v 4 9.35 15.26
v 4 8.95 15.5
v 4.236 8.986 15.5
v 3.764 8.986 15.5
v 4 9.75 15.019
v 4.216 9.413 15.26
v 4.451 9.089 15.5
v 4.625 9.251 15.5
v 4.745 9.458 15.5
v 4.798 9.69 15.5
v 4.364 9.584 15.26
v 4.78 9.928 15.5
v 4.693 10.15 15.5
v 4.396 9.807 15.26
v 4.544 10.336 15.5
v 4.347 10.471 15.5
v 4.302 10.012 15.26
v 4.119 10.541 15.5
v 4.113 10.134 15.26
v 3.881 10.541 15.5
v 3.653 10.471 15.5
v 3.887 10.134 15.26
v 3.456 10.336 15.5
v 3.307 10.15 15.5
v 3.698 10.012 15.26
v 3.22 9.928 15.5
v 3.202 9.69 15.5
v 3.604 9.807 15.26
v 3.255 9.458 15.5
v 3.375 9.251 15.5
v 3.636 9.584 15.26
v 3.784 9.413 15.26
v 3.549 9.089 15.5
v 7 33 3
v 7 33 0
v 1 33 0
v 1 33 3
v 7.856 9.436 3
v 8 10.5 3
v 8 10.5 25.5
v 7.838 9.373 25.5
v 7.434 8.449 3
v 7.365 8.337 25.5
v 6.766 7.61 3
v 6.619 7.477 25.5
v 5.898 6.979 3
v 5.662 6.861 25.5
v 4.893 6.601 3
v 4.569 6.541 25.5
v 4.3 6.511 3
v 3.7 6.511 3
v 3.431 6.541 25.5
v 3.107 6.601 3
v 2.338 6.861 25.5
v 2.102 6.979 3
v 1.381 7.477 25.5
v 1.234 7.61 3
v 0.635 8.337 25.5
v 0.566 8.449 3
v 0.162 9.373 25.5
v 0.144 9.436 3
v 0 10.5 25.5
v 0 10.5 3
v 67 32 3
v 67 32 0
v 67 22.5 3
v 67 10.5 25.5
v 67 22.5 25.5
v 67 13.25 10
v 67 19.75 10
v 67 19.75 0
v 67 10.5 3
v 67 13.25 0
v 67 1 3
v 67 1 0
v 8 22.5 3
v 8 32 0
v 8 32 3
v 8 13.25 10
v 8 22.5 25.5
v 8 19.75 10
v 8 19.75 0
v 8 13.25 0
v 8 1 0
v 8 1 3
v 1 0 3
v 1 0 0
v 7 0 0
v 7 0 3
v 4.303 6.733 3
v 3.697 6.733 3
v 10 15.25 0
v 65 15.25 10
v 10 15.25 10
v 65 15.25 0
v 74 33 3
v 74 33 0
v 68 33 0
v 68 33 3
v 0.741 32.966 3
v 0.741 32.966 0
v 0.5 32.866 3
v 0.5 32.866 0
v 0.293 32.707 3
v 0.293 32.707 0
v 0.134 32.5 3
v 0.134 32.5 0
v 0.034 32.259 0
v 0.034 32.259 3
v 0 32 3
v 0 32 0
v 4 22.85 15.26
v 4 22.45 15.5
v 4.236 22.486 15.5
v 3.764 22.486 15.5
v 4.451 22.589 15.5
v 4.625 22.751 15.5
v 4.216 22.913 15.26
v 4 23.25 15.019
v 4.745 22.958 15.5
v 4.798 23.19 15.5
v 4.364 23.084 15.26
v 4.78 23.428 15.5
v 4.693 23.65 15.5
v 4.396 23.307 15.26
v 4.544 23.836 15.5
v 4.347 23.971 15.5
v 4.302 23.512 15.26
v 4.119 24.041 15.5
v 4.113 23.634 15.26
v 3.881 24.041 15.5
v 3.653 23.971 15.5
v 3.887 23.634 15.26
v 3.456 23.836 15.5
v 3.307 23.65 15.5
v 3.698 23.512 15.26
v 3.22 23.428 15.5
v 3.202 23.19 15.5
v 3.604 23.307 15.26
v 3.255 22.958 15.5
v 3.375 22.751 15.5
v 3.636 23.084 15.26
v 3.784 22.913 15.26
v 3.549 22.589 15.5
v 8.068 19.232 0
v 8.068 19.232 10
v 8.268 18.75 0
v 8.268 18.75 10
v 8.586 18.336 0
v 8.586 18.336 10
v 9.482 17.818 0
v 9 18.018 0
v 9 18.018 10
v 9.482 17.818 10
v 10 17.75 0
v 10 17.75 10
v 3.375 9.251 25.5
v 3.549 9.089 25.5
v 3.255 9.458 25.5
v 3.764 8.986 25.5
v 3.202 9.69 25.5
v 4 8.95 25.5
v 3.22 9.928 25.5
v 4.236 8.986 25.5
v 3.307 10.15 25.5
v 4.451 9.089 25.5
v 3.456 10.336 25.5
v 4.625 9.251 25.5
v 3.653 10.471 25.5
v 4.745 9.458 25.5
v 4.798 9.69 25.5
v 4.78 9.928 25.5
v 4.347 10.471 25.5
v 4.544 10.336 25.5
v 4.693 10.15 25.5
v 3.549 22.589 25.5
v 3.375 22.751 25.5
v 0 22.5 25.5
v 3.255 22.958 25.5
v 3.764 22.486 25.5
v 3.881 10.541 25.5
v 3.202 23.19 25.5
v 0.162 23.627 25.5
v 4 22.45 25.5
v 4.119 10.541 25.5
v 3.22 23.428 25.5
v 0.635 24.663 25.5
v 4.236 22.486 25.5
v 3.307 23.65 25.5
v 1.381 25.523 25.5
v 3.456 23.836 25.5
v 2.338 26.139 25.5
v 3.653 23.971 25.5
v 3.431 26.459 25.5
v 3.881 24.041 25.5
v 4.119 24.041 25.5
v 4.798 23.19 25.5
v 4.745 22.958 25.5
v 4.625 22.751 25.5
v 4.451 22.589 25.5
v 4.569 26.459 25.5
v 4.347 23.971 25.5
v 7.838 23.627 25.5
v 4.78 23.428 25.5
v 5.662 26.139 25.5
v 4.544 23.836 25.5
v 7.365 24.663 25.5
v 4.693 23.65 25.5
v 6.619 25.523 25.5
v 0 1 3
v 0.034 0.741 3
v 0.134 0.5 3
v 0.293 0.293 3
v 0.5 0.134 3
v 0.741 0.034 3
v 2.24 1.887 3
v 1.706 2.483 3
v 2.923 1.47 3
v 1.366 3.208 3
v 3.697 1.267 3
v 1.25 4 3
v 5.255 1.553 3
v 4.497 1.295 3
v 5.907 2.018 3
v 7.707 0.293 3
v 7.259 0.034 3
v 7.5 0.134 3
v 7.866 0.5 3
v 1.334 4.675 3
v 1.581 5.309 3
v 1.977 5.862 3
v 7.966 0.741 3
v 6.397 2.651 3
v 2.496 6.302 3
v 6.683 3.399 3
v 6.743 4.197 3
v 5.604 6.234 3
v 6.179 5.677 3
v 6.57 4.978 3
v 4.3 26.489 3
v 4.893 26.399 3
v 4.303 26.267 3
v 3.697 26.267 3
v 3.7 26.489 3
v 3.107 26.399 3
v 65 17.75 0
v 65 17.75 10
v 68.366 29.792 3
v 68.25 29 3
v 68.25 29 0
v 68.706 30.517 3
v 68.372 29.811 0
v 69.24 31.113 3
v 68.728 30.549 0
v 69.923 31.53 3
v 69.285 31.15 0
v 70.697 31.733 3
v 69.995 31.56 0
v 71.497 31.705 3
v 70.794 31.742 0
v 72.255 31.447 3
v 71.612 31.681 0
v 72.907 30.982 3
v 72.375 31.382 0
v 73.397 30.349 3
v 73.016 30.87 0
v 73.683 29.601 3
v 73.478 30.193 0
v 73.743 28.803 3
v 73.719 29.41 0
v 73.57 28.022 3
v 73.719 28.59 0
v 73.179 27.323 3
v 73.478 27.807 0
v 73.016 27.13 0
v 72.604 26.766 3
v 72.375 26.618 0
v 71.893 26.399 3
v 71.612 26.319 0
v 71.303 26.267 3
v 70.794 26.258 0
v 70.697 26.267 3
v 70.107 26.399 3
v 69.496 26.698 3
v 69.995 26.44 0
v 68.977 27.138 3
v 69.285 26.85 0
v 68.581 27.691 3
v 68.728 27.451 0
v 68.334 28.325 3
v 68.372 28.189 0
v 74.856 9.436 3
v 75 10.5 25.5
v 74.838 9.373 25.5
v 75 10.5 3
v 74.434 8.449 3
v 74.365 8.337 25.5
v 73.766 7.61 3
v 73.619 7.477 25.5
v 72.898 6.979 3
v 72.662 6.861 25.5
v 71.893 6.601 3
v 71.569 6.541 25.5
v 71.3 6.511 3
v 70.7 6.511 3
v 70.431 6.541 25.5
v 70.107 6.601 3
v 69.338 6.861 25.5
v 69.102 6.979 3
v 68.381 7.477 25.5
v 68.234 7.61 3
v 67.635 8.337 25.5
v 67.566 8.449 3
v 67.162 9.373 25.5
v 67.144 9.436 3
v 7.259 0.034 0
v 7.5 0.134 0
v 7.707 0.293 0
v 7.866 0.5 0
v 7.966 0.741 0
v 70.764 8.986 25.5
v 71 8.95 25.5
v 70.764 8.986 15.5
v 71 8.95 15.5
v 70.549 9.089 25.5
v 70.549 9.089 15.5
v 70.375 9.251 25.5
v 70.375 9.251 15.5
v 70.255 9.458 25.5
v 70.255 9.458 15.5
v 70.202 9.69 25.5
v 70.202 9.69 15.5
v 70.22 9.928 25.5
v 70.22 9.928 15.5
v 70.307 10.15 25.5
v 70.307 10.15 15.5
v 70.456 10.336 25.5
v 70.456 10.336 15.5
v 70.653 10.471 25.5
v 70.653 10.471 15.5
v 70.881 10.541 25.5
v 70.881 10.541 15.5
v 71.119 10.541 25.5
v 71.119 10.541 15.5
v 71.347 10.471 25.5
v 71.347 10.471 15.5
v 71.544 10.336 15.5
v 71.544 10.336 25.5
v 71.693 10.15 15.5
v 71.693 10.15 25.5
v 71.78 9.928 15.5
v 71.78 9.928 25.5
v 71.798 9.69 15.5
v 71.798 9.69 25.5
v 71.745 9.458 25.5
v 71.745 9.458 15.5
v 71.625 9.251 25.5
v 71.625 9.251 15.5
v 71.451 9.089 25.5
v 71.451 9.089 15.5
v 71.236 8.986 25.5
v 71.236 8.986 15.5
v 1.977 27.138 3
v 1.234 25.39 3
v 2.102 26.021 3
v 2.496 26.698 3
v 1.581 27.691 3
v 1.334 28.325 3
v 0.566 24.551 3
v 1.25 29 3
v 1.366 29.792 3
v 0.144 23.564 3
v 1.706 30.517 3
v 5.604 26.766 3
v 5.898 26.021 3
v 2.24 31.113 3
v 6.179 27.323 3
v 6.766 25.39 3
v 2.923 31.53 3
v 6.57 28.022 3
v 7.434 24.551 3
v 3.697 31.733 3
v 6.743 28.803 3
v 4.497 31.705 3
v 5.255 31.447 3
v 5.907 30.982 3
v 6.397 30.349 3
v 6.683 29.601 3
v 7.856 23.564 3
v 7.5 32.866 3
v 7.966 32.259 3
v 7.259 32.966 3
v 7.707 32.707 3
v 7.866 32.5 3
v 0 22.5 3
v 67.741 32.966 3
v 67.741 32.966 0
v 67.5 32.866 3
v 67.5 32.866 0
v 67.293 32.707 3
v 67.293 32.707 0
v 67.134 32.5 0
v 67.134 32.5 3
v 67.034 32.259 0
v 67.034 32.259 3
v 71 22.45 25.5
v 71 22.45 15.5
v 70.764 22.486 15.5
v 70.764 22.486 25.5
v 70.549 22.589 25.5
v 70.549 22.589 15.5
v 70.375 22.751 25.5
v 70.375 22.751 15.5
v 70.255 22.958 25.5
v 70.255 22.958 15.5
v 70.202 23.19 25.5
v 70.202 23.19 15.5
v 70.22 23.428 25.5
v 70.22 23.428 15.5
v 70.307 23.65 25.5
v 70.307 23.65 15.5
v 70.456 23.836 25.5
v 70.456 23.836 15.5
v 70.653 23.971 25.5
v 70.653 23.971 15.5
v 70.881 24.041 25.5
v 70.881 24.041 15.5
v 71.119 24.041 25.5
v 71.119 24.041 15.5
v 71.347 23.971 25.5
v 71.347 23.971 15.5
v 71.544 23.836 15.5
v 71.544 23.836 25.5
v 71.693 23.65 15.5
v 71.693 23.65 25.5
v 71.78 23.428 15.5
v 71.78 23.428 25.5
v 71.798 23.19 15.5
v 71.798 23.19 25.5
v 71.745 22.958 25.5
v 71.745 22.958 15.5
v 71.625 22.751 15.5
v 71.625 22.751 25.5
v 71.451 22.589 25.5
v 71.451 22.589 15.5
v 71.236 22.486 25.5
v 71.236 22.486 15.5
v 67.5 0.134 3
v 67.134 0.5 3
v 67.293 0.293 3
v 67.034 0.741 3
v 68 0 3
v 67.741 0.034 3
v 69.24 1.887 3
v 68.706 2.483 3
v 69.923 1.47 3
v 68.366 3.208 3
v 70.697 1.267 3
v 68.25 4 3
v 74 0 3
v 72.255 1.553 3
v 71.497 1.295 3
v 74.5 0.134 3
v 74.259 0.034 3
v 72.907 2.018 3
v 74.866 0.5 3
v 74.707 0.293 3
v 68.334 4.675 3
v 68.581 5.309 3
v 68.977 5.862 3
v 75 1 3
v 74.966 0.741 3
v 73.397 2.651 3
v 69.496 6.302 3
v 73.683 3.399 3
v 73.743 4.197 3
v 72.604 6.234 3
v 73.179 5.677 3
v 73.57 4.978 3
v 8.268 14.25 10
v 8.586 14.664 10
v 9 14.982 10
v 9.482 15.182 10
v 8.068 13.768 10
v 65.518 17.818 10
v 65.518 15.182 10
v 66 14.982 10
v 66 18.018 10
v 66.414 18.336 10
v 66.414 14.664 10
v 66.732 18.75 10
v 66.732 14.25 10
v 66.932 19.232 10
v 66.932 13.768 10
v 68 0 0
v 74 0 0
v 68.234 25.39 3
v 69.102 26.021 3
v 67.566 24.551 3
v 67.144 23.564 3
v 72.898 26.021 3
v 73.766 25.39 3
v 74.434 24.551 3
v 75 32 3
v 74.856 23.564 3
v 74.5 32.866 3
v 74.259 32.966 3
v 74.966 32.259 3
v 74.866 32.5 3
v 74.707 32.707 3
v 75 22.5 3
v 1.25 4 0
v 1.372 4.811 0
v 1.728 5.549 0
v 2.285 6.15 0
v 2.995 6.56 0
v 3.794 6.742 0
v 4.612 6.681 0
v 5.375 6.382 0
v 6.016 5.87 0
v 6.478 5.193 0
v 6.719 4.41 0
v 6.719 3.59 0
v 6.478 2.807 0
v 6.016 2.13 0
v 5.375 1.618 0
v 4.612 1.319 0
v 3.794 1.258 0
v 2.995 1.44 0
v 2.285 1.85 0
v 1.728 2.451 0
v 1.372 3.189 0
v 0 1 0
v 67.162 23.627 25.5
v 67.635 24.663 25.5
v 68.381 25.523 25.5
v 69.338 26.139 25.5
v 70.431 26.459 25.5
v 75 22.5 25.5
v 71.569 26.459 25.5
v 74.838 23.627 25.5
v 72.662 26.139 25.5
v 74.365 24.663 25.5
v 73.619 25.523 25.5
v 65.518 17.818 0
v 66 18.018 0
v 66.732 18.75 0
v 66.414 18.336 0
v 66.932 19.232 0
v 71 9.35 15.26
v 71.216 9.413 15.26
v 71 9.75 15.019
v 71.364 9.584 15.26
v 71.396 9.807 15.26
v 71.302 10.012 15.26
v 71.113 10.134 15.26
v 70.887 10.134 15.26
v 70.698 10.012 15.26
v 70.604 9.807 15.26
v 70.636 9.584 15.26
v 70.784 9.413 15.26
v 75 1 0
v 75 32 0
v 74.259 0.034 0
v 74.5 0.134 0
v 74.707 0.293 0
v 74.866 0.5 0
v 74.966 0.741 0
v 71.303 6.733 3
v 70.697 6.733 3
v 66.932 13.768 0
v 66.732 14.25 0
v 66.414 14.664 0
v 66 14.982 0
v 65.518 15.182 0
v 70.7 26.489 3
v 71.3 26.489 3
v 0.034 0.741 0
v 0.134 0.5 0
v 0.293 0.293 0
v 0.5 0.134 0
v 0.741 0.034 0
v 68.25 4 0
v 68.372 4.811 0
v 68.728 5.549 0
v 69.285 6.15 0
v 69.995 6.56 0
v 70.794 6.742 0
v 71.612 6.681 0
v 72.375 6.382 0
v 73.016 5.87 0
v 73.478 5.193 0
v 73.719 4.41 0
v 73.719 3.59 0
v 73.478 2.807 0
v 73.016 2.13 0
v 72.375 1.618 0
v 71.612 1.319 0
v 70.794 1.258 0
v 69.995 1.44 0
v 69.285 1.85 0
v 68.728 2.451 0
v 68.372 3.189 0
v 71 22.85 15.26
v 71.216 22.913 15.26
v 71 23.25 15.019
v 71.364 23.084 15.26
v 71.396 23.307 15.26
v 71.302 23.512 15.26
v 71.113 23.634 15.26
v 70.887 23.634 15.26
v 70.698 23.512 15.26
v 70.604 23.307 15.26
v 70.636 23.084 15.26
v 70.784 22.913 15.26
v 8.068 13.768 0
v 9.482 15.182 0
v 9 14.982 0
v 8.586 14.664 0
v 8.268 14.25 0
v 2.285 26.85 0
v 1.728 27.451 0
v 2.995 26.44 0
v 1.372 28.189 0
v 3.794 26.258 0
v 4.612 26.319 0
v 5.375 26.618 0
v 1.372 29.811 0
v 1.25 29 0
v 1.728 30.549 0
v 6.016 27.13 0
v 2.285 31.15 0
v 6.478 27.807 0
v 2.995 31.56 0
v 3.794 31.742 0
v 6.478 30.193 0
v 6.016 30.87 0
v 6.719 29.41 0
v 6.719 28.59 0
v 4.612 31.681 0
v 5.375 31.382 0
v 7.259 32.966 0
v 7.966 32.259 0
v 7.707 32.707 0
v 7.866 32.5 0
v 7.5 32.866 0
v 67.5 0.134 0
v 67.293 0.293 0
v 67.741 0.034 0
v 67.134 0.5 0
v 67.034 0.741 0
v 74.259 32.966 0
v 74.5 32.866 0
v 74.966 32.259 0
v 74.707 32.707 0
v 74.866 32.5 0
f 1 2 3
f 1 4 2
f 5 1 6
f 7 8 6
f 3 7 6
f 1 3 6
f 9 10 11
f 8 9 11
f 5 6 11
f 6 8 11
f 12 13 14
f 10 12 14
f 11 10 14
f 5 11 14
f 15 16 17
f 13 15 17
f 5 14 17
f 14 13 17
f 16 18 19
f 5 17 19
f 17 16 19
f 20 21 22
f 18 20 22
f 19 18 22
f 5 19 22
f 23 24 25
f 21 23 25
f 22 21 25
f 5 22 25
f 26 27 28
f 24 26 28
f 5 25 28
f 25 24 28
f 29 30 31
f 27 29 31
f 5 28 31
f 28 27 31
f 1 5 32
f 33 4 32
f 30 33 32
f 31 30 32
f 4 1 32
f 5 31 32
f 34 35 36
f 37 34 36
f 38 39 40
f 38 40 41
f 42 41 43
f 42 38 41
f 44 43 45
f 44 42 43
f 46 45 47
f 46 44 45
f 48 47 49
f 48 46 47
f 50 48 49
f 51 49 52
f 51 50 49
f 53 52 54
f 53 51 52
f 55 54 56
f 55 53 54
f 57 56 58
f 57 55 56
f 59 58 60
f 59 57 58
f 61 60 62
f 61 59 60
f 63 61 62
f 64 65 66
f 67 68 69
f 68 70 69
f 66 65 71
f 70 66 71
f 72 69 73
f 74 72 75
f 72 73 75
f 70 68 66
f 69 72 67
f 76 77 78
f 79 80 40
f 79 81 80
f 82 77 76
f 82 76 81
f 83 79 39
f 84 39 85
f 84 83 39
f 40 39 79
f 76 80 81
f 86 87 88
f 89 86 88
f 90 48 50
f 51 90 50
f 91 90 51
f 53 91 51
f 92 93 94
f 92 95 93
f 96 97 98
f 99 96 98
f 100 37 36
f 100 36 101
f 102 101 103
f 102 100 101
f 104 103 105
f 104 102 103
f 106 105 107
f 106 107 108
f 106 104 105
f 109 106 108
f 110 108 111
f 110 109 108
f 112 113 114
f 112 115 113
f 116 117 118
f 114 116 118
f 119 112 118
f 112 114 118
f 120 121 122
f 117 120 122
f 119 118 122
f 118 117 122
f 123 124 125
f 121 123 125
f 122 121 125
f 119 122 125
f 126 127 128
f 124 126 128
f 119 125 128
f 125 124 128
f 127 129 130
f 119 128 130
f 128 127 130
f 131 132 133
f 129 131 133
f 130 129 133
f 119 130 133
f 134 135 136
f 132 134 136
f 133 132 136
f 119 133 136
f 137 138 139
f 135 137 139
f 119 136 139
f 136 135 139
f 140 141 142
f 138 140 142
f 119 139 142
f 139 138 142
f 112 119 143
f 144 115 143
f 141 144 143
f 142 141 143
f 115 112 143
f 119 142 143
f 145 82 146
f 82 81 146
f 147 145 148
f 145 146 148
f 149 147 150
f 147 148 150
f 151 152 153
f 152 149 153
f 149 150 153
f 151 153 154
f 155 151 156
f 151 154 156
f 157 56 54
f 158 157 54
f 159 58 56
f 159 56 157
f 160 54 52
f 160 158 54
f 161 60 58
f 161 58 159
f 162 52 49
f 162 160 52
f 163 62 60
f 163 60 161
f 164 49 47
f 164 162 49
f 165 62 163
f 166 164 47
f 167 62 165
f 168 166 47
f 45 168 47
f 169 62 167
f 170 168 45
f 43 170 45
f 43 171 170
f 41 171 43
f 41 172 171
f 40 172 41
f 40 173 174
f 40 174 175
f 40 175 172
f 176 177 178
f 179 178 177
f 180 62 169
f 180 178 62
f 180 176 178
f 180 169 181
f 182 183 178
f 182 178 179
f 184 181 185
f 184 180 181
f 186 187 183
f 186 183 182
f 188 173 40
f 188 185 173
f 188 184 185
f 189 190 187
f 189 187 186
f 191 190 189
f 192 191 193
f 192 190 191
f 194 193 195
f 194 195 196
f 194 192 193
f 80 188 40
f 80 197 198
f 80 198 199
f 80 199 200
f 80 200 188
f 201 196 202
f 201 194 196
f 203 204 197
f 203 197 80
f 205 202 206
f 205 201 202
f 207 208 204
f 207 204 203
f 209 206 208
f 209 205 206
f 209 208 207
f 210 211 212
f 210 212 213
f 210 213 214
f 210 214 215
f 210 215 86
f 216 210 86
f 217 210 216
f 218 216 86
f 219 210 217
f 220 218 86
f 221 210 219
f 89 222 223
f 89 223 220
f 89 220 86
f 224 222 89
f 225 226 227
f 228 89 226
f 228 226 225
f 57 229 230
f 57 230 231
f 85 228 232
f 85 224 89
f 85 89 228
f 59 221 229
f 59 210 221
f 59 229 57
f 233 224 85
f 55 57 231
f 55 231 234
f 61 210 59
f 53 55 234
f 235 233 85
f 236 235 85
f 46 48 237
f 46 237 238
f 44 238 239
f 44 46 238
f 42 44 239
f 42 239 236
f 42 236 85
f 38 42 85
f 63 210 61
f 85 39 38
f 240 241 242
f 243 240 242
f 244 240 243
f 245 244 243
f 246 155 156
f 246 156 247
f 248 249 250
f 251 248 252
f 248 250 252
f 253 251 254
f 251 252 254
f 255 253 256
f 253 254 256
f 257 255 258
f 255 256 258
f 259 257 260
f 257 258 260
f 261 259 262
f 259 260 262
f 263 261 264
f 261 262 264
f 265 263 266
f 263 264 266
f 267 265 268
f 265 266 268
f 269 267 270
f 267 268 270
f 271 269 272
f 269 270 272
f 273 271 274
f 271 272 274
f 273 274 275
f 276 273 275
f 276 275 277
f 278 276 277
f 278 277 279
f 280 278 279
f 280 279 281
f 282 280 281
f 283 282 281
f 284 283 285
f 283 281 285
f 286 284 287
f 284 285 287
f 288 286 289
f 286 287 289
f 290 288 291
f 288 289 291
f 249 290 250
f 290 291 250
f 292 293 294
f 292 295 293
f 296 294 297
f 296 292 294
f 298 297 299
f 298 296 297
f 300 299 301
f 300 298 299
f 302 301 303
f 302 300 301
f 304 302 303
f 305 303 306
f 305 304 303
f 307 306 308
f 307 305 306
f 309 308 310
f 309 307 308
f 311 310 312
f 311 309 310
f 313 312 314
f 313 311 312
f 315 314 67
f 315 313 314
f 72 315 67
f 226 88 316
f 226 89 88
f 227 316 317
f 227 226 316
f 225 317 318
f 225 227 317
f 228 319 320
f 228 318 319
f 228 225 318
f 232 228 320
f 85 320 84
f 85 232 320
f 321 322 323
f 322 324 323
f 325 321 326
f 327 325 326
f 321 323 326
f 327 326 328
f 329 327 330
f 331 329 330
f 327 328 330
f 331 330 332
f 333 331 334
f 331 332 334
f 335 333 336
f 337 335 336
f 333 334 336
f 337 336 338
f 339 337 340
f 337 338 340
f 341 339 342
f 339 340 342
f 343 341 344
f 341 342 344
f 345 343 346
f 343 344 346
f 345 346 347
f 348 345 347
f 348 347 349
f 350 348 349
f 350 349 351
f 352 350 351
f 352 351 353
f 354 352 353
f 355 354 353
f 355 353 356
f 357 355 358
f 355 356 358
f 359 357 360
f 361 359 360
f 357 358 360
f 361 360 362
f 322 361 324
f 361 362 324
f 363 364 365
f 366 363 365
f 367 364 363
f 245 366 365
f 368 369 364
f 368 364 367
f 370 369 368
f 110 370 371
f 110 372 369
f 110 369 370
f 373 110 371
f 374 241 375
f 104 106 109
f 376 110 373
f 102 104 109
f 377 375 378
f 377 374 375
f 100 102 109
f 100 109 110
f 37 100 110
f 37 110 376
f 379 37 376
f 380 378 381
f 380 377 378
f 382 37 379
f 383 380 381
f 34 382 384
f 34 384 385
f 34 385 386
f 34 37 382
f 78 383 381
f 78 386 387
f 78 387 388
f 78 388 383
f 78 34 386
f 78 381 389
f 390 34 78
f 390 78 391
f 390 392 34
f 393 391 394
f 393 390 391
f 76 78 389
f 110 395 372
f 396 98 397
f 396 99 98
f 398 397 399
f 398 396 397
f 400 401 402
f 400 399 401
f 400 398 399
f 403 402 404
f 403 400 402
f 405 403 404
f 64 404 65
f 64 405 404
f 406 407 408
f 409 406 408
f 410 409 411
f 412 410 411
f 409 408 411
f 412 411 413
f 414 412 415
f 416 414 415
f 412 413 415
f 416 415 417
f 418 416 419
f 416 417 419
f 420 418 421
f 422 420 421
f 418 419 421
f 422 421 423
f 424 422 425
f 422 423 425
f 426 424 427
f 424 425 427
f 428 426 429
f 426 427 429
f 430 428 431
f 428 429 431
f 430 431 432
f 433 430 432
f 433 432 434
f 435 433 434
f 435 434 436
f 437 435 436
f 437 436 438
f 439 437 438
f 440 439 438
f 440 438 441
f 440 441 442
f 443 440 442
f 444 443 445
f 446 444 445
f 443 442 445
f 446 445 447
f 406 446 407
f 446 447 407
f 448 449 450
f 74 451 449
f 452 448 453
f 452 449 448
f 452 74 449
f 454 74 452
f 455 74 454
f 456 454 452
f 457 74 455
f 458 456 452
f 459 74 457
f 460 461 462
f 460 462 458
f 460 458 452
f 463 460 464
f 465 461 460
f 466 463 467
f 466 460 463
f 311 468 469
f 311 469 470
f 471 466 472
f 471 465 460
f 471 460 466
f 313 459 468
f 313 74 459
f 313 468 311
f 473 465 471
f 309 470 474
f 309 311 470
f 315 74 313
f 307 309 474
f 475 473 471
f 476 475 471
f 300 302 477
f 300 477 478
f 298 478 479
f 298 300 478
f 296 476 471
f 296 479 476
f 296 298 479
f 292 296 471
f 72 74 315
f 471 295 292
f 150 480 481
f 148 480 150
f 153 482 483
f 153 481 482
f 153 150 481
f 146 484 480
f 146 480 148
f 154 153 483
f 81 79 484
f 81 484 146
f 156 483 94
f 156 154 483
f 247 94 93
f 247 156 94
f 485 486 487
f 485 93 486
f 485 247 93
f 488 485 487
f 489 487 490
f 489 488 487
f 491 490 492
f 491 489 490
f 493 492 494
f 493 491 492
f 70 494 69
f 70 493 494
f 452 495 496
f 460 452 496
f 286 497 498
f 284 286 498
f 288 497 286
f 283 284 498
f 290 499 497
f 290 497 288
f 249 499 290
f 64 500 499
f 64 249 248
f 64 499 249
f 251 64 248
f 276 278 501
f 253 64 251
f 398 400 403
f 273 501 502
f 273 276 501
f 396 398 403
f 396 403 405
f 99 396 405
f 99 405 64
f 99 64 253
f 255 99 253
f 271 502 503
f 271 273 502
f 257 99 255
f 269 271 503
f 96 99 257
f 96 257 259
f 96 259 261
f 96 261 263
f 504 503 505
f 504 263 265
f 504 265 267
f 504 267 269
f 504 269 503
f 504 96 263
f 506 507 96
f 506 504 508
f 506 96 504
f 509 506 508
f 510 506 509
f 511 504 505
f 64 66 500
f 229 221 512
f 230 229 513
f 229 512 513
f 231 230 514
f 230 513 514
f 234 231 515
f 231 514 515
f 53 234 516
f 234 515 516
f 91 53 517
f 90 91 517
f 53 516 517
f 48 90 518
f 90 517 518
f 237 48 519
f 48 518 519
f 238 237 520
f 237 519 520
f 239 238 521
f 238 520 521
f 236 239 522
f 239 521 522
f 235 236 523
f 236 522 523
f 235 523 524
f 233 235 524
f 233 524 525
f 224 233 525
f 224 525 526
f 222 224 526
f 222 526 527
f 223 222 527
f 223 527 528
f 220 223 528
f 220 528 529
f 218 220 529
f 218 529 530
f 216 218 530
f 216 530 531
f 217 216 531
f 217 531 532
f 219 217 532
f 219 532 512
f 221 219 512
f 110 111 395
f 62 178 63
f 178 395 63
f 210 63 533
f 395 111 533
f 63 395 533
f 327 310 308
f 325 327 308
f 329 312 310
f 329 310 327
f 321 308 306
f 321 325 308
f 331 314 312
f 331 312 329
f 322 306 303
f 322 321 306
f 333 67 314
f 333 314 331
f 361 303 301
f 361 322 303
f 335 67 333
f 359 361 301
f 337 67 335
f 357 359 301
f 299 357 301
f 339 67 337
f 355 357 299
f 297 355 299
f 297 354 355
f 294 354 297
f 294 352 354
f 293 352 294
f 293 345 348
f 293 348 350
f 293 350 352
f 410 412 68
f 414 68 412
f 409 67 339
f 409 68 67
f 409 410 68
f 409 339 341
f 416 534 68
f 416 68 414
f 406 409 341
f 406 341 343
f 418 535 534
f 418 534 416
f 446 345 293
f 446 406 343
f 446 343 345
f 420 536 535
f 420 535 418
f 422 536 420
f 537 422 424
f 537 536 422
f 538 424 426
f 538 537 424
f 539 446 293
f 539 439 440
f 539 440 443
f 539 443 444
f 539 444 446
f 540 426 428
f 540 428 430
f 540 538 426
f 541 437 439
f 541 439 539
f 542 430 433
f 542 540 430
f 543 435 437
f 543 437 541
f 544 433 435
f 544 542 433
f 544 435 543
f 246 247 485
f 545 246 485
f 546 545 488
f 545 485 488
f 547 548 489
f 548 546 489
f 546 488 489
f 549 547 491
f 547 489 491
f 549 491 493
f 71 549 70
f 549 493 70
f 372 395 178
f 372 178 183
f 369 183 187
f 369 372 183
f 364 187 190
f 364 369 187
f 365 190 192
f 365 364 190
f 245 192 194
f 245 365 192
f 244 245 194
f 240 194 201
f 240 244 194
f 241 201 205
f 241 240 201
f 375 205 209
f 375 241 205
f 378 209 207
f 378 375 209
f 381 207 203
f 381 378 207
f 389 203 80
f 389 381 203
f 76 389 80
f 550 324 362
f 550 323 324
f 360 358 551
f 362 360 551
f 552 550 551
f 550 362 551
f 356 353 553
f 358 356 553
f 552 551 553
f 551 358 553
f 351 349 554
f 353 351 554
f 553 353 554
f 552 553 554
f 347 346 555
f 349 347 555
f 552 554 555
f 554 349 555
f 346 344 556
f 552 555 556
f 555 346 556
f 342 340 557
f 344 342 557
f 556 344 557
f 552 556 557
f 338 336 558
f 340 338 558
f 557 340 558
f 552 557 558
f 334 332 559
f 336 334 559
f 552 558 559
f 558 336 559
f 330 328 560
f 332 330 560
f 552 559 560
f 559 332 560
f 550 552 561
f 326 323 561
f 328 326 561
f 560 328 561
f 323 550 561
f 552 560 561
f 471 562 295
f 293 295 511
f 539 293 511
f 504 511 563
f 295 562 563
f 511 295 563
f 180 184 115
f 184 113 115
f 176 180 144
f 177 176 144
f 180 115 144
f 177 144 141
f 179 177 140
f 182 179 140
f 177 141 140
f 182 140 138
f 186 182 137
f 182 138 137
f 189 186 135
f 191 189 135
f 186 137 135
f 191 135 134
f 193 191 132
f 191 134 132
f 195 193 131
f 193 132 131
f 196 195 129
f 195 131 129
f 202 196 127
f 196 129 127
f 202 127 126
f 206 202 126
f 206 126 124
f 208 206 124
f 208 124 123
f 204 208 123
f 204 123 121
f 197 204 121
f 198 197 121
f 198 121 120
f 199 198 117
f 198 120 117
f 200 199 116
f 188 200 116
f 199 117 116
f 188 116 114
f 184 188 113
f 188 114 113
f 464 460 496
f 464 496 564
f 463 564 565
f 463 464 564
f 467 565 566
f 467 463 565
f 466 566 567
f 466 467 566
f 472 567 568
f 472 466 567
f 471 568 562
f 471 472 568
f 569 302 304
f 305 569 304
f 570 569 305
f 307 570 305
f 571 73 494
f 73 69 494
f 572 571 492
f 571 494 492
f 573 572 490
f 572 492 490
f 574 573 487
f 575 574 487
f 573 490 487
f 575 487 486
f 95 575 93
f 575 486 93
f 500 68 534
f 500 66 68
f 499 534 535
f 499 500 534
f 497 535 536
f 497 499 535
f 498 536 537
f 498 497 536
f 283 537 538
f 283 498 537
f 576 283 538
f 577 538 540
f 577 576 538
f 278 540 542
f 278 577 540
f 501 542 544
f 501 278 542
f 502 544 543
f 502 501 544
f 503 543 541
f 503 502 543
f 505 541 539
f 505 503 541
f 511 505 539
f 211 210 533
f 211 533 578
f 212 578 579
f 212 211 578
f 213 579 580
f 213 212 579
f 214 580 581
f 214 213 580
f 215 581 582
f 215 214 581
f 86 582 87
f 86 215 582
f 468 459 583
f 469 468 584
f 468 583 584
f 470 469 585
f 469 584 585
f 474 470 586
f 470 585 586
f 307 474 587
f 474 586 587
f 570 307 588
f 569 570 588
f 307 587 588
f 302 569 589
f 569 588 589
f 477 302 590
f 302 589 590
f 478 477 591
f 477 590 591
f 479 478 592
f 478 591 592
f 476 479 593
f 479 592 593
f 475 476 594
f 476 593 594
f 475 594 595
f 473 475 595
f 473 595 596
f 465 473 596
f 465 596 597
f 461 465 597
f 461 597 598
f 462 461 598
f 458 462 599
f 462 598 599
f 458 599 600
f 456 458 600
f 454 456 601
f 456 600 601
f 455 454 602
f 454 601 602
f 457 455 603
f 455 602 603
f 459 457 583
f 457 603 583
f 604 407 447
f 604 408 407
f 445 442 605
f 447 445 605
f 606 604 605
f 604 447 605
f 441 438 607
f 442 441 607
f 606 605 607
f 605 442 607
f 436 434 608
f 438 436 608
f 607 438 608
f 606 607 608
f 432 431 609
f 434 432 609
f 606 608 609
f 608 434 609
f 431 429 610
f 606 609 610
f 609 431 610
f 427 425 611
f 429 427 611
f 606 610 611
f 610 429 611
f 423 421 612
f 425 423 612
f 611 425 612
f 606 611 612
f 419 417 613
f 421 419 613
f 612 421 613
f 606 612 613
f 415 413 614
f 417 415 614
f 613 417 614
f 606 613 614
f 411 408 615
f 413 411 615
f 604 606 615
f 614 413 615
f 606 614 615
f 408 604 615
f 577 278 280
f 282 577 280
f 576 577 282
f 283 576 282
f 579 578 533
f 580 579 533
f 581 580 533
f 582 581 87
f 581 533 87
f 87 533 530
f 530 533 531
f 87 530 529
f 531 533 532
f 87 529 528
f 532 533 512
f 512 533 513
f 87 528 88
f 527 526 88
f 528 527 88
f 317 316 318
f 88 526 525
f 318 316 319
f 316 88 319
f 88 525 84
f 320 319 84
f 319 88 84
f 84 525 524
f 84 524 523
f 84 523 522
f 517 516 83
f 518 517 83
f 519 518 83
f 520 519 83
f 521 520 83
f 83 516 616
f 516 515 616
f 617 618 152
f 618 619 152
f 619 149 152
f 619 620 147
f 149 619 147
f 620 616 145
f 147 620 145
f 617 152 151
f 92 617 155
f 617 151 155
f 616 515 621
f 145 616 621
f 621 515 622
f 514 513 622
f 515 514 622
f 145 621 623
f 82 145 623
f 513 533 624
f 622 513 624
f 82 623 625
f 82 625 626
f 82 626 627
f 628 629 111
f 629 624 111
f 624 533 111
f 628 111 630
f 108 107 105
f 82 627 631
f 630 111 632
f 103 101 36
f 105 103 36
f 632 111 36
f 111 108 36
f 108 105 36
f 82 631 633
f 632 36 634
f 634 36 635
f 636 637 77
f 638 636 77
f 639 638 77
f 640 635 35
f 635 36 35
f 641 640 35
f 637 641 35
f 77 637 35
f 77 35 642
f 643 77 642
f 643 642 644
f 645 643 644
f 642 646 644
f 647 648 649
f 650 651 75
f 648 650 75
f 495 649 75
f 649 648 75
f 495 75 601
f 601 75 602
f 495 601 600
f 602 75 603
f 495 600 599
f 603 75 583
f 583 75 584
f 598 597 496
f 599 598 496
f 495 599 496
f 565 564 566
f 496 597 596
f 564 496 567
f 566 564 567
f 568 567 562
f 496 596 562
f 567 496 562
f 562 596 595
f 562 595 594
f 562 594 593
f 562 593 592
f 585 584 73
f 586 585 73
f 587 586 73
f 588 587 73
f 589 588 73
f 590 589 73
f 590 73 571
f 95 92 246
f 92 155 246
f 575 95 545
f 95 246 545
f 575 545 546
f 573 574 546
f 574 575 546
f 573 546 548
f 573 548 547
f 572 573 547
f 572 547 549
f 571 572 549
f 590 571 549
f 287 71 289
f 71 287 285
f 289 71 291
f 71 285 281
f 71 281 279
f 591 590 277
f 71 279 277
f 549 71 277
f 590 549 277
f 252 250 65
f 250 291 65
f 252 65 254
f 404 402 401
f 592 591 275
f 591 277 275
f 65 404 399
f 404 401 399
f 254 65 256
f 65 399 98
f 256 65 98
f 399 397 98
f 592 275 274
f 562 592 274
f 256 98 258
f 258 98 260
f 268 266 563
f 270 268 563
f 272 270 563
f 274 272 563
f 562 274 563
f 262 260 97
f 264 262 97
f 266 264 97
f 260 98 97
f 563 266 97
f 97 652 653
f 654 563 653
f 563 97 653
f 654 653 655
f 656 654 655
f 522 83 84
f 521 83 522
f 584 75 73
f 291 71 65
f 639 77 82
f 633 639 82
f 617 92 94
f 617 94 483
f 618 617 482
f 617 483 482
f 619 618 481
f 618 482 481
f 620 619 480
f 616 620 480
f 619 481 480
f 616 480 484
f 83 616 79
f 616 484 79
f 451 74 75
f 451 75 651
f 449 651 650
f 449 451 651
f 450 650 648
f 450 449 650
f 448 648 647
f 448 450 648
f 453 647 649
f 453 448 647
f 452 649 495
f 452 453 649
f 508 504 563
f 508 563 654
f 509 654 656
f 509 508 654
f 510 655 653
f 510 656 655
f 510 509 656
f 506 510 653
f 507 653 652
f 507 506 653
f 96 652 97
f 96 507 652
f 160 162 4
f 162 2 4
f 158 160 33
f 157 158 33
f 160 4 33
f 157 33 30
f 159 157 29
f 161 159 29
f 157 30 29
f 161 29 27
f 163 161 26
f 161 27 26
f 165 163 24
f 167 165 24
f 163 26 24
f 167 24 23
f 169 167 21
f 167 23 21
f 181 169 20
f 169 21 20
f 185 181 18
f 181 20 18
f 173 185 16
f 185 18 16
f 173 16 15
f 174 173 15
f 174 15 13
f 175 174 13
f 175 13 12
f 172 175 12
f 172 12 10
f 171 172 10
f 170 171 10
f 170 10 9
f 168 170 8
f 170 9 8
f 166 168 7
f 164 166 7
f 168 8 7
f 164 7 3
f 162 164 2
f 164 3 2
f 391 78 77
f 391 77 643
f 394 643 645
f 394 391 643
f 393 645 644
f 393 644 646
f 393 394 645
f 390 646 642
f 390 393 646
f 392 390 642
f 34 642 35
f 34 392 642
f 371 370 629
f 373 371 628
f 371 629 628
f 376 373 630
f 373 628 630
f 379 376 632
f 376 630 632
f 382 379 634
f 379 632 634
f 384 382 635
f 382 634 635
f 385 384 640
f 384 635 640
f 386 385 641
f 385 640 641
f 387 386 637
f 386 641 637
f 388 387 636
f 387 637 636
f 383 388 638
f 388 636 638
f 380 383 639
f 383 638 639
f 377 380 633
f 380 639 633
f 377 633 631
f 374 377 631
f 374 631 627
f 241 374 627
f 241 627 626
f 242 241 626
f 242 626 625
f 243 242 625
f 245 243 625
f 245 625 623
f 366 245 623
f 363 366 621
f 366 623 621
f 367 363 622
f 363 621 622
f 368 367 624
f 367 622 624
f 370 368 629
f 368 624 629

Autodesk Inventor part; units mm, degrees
ref_plane "YZ Plane" through (0, 0, 0) normal (1, 0, 0) x (0, 1, 0)
ref_plane "XZ Plane" through (0, 0, 0) normal (0, 1, 0) x (-1, 0, 0)
ref_plane "XY Plane" through (0, 0, 0) normal (0, 0, 1) x (1, 0, 0)
sketch "Esquisse1" plane through (0, 0, 0) normal (0, 0, 1) x (1, 0, 0)
  line L0 (75, 0) -> (75, 33)
  line L1 (0, 33) -> (0, 0)
  line L2 (8, 33) -> (8, 0)
  line L3 (67, 33) -> (67, 0)
  line L4 (8, 17.75) -> (67, 17.75)
  line L5 (67, 17.75) -> (67, 15.25)
  line L6 (67, 15.25) -> (8, 15.25)
  line L7 (8, 15.25) -> (8, 17.75)
  line L8 (75, 33) -> (67, 33)
  line L9 (8, 33) -> (0, 33)
  line L10 (0, 0) -> (8, 0)
  line L11 (67, 0) -> (75, 0)
  line L12 (1.5, 6.5) -> (6.5, 6.5)
  line L13 (6.5, 6.5) -> (6.5, 1.5)
  line L14 (6.5, 1.5) -> (1.5, 1.5)
  line L15 (1.5, 1.5) -> (1.5, 6.5)
  line L16 (0, 16.5) -> (-2.6312, 16.5)
  line L17 (37.5, 15.25) -> (37.5, 13.3261)
  line L18 (1.5, 26.5) -> (6.5, 26.5)
  line L19 (6.5, 26.5) -> (6.5, 31.5)
  line L20 (6.5, 31.5) -> (1.5, 31.5)
  line L21 (1.5, 31.5) -> (1.5, 26.5)
  line L22 (73.5, 6.5) -> (68.5, 6.5)
  line L23 (68.5, 6.5) -> (68.5, 1.5)
  line L24 (68.5, 1.5) -> (73.5, 1.5)
  line L25 (73.5, 1.5) -> (73.5, 6.5)
  line L26 (68.5, 26.5) -> (68.5, 31.5)
  line L27 (68.5, 31.5) -> (73.5, 31.5)
  line L28 (73.5, 31.5) -> (73.5, 26.5)
  line L29 (73.5, 26.5) -> (68.5, 26.5)
  arc A0 (8, 22.5) -> (0, 22.5) centre (4, 22.5) ccw
  arc A1 (0, 10.5) -> (8, 10.5) centre (4, 10.5) ccw
  arc A2 (75, 22.5) -> (67, 22.5) centre (71, 22.5) ccw
  arc A3 (67, 10.5) -> (75, 10.5) centre (71, 10.5) ccw
  line L30 (67, 22.5) -> (67, 10.5)
  line L31 (75, 10.5) -> (75, 22.5)
  line L32 (8, 22.5) -> (8, 10.5)
  line L33 (0, 10.5) -> (0, 22.5)
  dimension "d0" = 33
  dimension "d1" = 75
  dimension "d2" = 8
  dimension "d3" = 8
  dimension "d4" = 2.5
  dimension "d6" = 5
  dimension "d7" = 5
  dimension "d8" = 1.5
  dimension "d9" = 1.5
  dimension "d10" = 8
  dimension "d11" = 8
  dimension "d12" = 12
  dimension "d13" = 10.5
extrude "Extrusion1" add sketch "Esquisse1" along normal blind 3 contours L11 L3 A3 L0 | A2 L3 L8 L0 | A0 L1 L9 L2 | L2 L10 L1 A1
extrude "Extrusion2" add sketch "Esquisse1" along normal blind 25.5 contours A3 L3 A2 L0 | L2 A1 L1 A0
extrude "Extrusion3" add sketch "Esquisse1" along normal blind 10 contours L6 L2 L4 L3
fillet "Congé1" radius 2 4 edges at (8, 15.25, 5) (8, 17.75, 5) (67, 15.25, 5) (67, 17.75, 5)
hole "Perçage1" at (71, 23.25, 25.5) direction (0, 0, -1) diameter 1.6 depth 10 tip angle 118
hole "Perçage2" at (71, 9.75, 25.5) direction (0, 0, -1) diameter 1.6 depth 10 tip angle 118
hole "Perçage3" at (4, 23.25, 25.5) direction (0, 0, -1) diameter 1.6 depth 10 tip angle 118
hole "Perçage4" at (4, 9.75, 25.5) direction (0, 0, -1) diameter 1.6 depth 10 tip angle 118
fillet "Congé2" radius 1 8 edges at (8, 0, 1.5) (0, 0, 1.5) (67, 0, 1.5) (75, 0, 1.5) (67, 33, 1.5) (75, 33, 1.5) (8, 33, 1.5) (0, 33, 1.5)
sketch "Esquisse3" plane through (0, 0, 3) normal (0, 0, 1) x (1, 0, 0)
  arc A0 (1, 33) -> (0, 32) centre (1, 32) ccw projected
  line L0 (0, 32) -> (0, 22.5) projected
  arc A1 (4, 26.5) -> (0, 22.5) centre (4, 22.5) ccw projected
  line L1 (4, 26.5) -> (1.5, 26.5) projected
  line L2 (1.5, 26.5) -> (1.5, 31.5) projected
  line L3 (1.5, 31.5) -> (6.5, 31.5) projected
  line L4 (6.5, 31.5) -> (6.5, 26.5) projected
  line L5 (6.5, 26.5) -> (4, 26.5) projected
  arc A2 (8, 22.5) -> (4, 26.5) centre (4, 22.5) ccw projected
  line L6 (8, 22.5) -> (8, 32) projected
  arc A3 (8, 32) -> (7, 33) centre (7, 32) ccw projected
  line L7 (7, 33) -> (1, 33) projected
  arc A4 (75, 32) -> (74, 33) centre (74, 32) ccw projected
  line L8 (74, 33) -> (68, 33) projected
  arc A5 (68, 33) -> (67, 32) centre (68, 32) ccw projected
  line L9 (67, 32) -> (67, 22.5) projected
  arc A6 (71, 26.5) -> (67, 22.5) centre (71, 22.5) ccw projected
  line L10 (71, 26.5) -> (68.5, 26.5) projected
  line L11 (68.5, 26.5) -> (68.5, 31.5) projected
  line L12 (68.5, 31.5) -> (73.5, 31.5) projected
  line L13 (73.5, 31.5) -> (73.5, 26.5) projected
  line L14 (73.5, 26.5) -> (71, 26.5) projected
  arc A7 (75, 22.5) -> (71, 26.5) centre (71, 22.5) ccw projected
  line L15 (75, 22.5) -> (75, 32) projected
  arc A8 (74, 0) -> (75, 1) centre (74, 1) ccw projected
  line L16 (75, 1) -> (75, 10.5) projected
  arc A9 (71, 6.5) -> (75, 10.5) centre (71, 10.5) ccw projected
  line L17 (71, 6.5) -> (73.5, 6.5) projected
  line L18 (73.5, 6.5) -> (73.5, 1.5) projected
  line L19 (73.5, 1.5) -> (68.5, 1.5) projected
  line L20 (68.5, 1.5) -> (68.5, 6.5) projected
  line L21 (68.5, 6.5) -> (71, 6.5) projected
  arc A10 (67, 10.5) -> (71, 6.5) centre (71, 10.5) ccw projected
  line L22 (67, 10.5) -> (67, 1) projected
  arc A11 (67, 1) -> (68, 0) centre (68, 1) ccw projected
  line L23 (68, 0) -> (74, 0) projected
  arc A12 (0, 1) -> (1, 0) centre (1, 1) ccw projected
  line L24 (1, 0) -> (7, 0) projected
  arc A13 (7, 0) -> (8, 1) centre (7, 1) ccw projected
  line L25 (8, 1) -> (8, 10.5) projected
  arc A14 (4, 6.5) -> (8, 10.5) centre (4, 10.5) ccw projected
  line L26 (4, 6.5) -> (6.5, 6.5) projected
  line L27 (6.5, 6.5) -> (6.5, 1.5) projected
  line L28 (6.5, 1.5) -> (1.5, 1.5) projected
  line L29 (1.5, 1.5) -> (1.5, 6.5) projected
  line L30 (1.5, 6.5) -> (4, 6.5) projected
  arc A15 (0, 10.5) -> (4, 6.5) centre (4, 10.5) ccw projected
  line L31 (0, 10.5) -> (0, 1) projected
  circle A16 centre (4, 29) radius 2.5
  circle A17 centre (4, 4) radius 2.5
  circle A18 centre (71, 4) radius 2.5
  circle A19 centre (71, 29) radius 2.5
  point P0 (0, 0)
extrude "Extrusion4" add sketch "Esquisse3" against normal up to surface (3 mm away) contours L1 L2 A16 | A16 L4 L5 | A16 L3 L4 | L2 L3 A16 | L10 L11 A19 | A19 L13 L14 | L15 A7 A6 L9 A5 L8 A4 | A19 L12 L13 | L11 L12 A19 | L17 L18 A18 | A18 L20 L21 | L18 L19 A18 | A18 L19 L20 | L26 L27 A17 | A17 L29 L30 | L31 A15 A14 L25 A13 L24 A12 | L27 L28 A17 | A17 L28 L29
sketch "Esquisse4" plane through (0, 0, 0) normal (0, 0, -1) x (-1, 0, 0)
  circle A0 centre (-4, 29) radius 2.5 projected
  circle A1 centre (-4, 4) radius 2.5 projected
  circle A2 centre (-71, 4) radius 2.5 projected
  circle A3 centre (-71, 29) radius 2.5 projected
  circle A4 centre (-4, 29) radius 2.75
  circle A5 centre (-4, 4) radius 2.75
  circle A6 centre (-71, 29) radius 2.75
  circle A7 centre (-71, 4) radius 2.75
  point P0 (0, 0)
  dimension "d61" = 5.5
  dimension "d62" = 5.5
  dimension "d63" = 5.5
  dimension "d64" = 5.5
extrude "Extrusion5" cut sketch "Esquisse4" against normal blind 3
equation "\"d9\" = -0.5 * d6 + 0.5 * d2"
equation "\"d13\" = -0.5 * d12 + 0.5 * d0"
properties part number "red_part-july21" material "Plastique ABS"
